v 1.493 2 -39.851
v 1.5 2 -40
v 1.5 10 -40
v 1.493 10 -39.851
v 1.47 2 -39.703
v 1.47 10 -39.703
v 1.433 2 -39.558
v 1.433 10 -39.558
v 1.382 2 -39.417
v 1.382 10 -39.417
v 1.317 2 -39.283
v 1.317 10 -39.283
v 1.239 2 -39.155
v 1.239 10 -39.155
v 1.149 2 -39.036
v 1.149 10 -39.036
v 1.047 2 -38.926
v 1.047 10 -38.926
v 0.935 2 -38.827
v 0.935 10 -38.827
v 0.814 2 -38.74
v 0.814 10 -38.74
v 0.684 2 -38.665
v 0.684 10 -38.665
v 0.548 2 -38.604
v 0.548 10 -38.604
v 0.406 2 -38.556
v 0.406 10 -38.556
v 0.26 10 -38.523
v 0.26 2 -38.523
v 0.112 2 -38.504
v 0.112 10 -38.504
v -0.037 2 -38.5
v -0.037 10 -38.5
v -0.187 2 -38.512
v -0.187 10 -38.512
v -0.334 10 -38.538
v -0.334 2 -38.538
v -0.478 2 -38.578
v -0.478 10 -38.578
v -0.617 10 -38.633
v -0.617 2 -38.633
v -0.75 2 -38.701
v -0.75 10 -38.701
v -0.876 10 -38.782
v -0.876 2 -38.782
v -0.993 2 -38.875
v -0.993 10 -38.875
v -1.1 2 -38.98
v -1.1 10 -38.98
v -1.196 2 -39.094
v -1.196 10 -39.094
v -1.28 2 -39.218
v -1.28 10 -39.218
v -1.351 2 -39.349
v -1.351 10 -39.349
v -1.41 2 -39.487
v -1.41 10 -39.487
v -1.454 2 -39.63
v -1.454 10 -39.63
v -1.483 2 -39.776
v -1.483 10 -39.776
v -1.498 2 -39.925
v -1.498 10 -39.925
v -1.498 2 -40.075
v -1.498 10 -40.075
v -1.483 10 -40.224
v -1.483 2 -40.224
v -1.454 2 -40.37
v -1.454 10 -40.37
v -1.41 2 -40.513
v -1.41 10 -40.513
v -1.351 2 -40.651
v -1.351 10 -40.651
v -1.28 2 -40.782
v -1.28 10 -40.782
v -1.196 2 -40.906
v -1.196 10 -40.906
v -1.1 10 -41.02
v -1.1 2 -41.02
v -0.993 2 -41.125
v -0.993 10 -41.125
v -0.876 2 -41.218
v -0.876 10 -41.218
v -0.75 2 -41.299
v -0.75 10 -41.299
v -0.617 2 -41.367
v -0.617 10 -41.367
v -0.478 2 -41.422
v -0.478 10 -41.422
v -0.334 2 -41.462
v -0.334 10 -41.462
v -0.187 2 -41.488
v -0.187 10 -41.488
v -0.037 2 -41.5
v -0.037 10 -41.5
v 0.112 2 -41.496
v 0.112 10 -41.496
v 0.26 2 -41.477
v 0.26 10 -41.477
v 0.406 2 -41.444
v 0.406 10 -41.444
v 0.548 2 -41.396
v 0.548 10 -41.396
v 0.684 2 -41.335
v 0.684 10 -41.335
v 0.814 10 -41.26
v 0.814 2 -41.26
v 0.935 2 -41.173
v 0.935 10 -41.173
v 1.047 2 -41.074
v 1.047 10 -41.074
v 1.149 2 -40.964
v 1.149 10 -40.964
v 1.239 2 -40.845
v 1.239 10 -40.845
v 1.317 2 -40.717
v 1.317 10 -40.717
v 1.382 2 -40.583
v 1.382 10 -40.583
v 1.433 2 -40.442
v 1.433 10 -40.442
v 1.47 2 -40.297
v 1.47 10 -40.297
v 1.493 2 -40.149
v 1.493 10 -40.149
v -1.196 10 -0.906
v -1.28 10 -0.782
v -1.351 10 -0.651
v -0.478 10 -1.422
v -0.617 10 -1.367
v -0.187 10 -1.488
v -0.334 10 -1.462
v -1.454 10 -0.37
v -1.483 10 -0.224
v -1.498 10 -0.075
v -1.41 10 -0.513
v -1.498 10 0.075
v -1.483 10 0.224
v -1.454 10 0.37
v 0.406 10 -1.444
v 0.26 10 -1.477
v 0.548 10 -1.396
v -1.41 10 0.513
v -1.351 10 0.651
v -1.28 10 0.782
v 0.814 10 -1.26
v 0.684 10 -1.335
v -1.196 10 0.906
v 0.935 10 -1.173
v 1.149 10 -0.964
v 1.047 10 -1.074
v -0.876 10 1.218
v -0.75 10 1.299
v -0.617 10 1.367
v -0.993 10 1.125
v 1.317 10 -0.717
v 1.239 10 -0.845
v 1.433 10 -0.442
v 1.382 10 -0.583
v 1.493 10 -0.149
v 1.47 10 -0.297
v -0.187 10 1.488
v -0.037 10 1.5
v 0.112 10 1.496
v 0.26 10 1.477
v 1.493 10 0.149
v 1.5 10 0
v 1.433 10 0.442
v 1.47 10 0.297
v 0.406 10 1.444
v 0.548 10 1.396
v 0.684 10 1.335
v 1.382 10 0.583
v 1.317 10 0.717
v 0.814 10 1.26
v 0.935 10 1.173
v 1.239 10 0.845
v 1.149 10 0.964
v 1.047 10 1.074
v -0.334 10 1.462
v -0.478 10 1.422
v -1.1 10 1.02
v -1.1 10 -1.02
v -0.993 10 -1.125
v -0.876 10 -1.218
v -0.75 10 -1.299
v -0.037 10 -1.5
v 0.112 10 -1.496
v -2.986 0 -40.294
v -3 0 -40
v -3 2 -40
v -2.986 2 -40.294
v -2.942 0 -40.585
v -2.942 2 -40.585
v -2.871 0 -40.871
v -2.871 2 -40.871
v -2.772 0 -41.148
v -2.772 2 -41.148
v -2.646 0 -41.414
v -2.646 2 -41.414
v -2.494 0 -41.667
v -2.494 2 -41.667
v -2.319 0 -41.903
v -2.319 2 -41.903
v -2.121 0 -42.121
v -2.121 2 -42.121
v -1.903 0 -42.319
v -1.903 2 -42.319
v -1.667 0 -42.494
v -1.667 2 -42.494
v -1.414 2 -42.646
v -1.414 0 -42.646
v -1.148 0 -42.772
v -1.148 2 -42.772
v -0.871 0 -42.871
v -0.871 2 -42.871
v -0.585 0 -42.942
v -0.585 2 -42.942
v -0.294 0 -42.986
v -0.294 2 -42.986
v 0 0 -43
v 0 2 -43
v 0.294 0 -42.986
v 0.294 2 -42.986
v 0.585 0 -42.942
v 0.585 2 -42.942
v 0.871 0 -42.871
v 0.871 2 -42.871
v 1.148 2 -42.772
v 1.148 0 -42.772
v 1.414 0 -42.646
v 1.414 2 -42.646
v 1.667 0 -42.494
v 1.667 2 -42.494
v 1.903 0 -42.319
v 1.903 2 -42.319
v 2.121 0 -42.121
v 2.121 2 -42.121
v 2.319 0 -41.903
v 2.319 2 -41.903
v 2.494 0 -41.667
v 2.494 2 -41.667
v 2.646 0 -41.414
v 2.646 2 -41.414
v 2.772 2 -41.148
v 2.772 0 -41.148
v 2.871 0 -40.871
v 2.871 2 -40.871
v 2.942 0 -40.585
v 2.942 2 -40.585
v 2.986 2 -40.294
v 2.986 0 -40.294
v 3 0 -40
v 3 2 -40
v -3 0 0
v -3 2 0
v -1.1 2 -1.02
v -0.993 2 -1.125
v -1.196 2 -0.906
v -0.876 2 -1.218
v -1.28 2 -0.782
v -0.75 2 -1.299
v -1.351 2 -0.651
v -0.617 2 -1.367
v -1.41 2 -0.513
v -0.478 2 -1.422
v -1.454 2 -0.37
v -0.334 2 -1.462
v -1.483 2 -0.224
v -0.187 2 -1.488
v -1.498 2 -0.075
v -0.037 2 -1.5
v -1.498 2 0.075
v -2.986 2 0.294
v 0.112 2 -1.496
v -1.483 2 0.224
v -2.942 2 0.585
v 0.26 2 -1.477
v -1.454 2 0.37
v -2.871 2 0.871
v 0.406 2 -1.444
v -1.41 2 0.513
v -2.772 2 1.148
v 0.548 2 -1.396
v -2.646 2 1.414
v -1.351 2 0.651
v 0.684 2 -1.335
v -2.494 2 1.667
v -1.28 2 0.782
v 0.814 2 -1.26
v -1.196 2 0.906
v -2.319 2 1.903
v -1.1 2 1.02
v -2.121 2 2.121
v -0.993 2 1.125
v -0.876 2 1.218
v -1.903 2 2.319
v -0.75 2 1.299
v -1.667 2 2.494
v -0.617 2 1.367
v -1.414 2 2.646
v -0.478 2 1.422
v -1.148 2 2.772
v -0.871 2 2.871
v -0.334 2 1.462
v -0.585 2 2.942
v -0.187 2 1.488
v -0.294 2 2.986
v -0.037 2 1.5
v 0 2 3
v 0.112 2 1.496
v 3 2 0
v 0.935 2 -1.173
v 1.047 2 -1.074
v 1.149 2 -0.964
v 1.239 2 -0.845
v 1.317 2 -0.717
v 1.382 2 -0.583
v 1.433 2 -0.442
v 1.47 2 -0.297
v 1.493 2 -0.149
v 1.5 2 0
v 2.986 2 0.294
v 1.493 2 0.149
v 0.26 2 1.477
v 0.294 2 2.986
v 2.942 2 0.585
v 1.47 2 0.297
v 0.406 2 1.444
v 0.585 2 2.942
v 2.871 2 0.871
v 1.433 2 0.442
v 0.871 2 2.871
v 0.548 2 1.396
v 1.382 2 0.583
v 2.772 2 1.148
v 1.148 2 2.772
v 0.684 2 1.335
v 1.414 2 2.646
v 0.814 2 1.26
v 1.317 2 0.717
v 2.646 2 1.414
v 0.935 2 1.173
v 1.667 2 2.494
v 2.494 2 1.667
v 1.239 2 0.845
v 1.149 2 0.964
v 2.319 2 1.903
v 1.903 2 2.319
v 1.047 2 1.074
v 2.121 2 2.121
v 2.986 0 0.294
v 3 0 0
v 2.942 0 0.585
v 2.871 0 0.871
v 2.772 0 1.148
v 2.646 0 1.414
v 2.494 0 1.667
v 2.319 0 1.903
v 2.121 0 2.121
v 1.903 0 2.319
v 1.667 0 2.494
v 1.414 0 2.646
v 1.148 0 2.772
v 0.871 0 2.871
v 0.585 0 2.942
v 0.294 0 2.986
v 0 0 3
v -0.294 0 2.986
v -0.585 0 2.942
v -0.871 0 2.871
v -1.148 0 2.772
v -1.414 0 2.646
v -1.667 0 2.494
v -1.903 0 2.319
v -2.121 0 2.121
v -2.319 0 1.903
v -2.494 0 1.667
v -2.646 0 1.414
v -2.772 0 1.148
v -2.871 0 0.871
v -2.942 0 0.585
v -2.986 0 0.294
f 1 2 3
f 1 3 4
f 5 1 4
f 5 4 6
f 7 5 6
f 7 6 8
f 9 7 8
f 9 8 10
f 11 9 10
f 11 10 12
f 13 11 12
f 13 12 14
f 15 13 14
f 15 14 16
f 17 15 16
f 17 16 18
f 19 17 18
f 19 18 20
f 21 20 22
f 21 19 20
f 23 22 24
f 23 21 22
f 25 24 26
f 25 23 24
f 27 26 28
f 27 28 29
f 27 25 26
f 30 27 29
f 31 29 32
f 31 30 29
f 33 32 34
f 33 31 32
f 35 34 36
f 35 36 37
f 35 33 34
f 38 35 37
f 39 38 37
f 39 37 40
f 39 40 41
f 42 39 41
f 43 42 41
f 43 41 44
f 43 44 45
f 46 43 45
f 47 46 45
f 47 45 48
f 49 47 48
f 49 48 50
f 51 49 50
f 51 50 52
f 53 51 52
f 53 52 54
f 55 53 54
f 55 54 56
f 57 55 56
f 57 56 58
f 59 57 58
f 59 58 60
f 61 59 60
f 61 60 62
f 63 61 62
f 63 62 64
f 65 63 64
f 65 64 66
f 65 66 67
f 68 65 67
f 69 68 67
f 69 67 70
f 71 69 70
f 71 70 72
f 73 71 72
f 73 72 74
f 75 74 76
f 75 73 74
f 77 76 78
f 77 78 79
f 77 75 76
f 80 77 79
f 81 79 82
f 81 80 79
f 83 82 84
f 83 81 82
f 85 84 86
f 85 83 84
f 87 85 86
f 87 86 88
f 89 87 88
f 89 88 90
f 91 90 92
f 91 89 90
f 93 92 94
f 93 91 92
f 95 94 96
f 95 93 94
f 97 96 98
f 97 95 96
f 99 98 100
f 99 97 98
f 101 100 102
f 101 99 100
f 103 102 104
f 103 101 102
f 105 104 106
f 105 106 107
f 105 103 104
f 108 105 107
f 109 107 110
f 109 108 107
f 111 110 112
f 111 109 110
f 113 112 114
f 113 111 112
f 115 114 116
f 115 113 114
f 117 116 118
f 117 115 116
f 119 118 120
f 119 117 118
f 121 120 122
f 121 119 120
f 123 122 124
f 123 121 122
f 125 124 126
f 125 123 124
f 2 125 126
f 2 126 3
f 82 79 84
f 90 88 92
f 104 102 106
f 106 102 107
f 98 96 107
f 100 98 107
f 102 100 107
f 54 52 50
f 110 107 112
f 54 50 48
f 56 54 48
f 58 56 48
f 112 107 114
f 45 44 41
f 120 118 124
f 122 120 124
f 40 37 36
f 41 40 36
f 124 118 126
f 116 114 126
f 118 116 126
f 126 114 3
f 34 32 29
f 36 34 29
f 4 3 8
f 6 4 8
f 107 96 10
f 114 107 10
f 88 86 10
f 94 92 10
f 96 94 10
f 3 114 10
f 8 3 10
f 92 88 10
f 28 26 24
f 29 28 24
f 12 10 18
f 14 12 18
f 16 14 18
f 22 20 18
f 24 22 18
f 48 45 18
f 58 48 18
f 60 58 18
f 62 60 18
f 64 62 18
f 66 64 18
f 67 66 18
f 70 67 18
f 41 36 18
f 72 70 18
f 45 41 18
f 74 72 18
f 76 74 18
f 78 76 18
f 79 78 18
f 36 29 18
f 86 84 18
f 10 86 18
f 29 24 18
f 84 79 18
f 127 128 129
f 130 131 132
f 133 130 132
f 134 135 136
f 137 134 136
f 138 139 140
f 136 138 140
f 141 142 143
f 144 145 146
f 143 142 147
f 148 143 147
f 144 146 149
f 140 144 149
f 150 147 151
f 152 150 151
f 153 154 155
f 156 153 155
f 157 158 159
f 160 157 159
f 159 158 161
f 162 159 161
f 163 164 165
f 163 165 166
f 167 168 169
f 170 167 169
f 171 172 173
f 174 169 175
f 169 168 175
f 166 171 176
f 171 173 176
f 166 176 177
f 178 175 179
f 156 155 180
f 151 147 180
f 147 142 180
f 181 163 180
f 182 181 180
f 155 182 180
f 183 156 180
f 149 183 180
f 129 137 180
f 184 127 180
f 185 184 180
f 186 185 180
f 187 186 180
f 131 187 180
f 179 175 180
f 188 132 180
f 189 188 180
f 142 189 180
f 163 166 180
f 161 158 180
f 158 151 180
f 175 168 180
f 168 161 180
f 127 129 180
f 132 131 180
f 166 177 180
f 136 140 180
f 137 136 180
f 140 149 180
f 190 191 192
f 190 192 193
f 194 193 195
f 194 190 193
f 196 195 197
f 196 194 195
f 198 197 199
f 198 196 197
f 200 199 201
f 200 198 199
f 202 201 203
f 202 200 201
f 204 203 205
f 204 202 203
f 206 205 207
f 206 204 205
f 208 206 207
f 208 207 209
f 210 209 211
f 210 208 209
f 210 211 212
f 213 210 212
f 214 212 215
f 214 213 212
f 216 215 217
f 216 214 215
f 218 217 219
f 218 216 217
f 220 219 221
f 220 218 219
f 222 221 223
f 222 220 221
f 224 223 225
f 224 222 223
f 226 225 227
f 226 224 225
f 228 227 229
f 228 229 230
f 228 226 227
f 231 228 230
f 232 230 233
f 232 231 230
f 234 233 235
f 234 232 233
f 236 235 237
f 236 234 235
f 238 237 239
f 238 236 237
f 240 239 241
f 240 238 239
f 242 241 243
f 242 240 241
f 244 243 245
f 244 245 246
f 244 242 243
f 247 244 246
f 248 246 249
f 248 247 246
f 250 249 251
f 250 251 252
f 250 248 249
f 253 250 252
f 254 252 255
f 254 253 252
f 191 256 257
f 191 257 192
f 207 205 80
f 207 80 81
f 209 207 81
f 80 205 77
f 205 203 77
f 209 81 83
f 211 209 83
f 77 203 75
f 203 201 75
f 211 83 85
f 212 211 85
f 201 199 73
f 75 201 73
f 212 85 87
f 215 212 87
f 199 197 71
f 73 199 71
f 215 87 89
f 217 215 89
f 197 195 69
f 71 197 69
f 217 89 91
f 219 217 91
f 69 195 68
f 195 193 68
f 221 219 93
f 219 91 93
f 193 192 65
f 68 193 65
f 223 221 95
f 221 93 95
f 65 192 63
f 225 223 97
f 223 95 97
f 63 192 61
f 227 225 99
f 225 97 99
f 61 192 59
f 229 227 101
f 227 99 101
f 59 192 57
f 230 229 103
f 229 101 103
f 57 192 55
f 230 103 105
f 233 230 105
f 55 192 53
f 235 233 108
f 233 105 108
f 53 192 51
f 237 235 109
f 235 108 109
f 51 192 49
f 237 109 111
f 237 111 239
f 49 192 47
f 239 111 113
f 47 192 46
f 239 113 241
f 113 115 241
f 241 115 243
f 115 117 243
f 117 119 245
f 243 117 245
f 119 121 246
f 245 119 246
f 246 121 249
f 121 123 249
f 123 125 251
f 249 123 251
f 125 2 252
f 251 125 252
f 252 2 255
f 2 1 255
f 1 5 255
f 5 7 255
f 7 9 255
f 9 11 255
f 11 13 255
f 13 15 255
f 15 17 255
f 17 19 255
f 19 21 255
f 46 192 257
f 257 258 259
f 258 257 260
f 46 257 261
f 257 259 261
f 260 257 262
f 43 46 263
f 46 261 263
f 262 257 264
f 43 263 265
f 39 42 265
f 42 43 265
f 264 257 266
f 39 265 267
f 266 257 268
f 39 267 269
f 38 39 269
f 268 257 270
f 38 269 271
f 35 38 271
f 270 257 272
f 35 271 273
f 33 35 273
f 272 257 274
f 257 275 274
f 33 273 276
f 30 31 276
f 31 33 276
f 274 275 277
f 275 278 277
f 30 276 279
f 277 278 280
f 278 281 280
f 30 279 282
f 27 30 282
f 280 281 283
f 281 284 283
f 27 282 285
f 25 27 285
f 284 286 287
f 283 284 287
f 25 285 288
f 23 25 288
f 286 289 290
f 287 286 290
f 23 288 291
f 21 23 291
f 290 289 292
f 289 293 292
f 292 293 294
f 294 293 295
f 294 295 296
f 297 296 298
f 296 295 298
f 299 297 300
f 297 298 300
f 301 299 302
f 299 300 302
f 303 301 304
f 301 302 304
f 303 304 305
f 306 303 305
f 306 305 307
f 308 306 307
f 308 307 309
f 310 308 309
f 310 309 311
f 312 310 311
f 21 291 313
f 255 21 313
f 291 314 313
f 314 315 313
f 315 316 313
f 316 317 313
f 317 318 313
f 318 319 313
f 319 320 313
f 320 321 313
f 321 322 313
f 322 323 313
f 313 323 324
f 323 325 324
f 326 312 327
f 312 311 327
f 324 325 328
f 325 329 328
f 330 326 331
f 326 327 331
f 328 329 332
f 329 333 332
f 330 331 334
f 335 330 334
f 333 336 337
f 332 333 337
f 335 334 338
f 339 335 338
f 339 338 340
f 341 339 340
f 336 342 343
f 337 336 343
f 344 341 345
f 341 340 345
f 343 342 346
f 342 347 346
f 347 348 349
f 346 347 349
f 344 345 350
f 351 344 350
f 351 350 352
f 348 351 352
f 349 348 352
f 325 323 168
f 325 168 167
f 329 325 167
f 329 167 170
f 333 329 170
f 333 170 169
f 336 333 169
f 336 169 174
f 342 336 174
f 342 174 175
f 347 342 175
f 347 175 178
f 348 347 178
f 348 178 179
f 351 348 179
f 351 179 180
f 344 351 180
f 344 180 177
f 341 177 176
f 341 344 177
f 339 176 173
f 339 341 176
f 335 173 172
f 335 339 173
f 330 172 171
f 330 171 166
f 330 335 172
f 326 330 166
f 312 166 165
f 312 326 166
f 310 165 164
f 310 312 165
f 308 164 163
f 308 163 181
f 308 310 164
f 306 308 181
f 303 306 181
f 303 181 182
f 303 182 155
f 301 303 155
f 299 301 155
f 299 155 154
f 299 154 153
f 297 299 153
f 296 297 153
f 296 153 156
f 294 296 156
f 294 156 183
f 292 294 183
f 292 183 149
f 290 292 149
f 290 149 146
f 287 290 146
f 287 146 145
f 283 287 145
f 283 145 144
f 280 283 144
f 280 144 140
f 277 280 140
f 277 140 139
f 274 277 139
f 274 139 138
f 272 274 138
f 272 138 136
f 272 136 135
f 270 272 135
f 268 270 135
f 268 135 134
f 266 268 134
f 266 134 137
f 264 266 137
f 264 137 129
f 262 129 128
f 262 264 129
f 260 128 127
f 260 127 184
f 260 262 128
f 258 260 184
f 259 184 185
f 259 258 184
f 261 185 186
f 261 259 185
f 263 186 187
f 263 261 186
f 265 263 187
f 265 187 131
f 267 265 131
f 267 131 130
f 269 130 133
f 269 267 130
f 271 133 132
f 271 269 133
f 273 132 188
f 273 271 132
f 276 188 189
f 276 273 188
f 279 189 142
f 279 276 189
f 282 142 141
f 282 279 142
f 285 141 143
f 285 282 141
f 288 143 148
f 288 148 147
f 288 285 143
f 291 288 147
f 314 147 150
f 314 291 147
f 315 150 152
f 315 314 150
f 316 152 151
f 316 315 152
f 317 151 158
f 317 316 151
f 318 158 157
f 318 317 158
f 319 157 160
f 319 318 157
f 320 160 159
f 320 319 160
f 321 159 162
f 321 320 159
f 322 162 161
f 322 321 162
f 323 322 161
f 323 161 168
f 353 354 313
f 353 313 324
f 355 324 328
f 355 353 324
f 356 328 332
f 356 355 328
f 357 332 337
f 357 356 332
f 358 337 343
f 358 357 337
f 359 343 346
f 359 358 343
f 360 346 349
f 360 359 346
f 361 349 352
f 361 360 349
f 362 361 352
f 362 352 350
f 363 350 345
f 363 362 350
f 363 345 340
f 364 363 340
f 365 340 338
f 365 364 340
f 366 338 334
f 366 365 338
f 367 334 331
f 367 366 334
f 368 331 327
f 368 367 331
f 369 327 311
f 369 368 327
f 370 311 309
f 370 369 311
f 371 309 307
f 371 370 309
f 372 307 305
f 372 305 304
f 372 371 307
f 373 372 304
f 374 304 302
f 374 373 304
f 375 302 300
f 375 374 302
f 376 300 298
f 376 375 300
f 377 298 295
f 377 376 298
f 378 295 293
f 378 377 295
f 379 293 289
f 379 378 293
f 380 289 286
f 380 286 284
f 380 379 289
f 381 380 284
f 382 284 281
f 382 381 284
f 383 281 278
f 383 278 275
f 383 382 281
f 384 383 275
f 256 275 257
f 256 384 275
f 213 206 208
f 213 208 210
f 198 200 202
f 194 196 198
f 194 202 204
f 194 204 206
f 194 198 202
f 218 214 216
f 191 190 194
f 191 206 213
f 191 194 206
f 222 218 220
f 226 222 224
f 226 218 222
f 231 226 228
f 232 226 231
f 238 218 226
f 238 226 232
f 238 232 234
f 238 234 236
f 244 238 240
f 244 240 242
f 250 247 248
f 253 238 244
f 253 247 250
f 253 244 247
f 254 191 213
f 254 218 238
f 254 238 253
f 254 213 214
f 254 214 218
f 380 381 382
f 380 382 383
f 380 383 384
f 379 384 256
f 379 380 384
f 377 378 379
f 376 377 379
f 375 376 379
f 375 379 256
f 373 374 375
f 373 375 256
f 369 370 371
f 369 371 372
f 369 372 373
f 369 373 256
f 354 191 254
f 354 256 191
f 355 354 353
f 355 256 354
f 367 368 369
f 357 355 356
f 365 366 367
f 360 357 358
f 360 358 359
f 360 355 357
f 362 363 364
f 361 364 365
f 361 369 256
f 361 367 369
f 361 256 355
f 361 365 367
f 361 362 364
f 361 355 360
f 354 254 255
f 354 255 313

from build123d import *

# Parameters (mm, degrees)
F0_R     = 1.5
F1_DEPTH = 10
F3_R     = 1.5
F4_DEPTH = 10
F5_DEPTH = 2


with BuildPart() as f1:
    # F0 (on Front) → F1 (new body)
    with BuildSketch(Plane.XZ):
        Circle(F0_R)
    extrude(amount=-F1_DEPTH)



with BuildPart() as f4:
    # F3 (on Front) → F4 (new body, through all)
    with BuildSketch(Plane.XZ):
        with Locations((0, -40)):
            Circle(F3_R)
    extrude(amount=-F4_DEPTH)


with BuildPart() as f1_1:
    add(f1.part)

    add(f4.part)  # F5 merges F4
    # F2 (on Front) → F5 (join)
    with BuildSketch(Plane.XZ):
        with BuildLine():
            ThreePointArc((3, 0), (0, 3), (-3, 0))
            Line((-3, 0), (-3, -40))
            ThreePointArc((-3, -40), (0, -43), (3, -40))
            Line((3, -40), (3, 0))
        make_face()
    extrude(amount=-F5_DEPTH)


solid = f1_1.part
